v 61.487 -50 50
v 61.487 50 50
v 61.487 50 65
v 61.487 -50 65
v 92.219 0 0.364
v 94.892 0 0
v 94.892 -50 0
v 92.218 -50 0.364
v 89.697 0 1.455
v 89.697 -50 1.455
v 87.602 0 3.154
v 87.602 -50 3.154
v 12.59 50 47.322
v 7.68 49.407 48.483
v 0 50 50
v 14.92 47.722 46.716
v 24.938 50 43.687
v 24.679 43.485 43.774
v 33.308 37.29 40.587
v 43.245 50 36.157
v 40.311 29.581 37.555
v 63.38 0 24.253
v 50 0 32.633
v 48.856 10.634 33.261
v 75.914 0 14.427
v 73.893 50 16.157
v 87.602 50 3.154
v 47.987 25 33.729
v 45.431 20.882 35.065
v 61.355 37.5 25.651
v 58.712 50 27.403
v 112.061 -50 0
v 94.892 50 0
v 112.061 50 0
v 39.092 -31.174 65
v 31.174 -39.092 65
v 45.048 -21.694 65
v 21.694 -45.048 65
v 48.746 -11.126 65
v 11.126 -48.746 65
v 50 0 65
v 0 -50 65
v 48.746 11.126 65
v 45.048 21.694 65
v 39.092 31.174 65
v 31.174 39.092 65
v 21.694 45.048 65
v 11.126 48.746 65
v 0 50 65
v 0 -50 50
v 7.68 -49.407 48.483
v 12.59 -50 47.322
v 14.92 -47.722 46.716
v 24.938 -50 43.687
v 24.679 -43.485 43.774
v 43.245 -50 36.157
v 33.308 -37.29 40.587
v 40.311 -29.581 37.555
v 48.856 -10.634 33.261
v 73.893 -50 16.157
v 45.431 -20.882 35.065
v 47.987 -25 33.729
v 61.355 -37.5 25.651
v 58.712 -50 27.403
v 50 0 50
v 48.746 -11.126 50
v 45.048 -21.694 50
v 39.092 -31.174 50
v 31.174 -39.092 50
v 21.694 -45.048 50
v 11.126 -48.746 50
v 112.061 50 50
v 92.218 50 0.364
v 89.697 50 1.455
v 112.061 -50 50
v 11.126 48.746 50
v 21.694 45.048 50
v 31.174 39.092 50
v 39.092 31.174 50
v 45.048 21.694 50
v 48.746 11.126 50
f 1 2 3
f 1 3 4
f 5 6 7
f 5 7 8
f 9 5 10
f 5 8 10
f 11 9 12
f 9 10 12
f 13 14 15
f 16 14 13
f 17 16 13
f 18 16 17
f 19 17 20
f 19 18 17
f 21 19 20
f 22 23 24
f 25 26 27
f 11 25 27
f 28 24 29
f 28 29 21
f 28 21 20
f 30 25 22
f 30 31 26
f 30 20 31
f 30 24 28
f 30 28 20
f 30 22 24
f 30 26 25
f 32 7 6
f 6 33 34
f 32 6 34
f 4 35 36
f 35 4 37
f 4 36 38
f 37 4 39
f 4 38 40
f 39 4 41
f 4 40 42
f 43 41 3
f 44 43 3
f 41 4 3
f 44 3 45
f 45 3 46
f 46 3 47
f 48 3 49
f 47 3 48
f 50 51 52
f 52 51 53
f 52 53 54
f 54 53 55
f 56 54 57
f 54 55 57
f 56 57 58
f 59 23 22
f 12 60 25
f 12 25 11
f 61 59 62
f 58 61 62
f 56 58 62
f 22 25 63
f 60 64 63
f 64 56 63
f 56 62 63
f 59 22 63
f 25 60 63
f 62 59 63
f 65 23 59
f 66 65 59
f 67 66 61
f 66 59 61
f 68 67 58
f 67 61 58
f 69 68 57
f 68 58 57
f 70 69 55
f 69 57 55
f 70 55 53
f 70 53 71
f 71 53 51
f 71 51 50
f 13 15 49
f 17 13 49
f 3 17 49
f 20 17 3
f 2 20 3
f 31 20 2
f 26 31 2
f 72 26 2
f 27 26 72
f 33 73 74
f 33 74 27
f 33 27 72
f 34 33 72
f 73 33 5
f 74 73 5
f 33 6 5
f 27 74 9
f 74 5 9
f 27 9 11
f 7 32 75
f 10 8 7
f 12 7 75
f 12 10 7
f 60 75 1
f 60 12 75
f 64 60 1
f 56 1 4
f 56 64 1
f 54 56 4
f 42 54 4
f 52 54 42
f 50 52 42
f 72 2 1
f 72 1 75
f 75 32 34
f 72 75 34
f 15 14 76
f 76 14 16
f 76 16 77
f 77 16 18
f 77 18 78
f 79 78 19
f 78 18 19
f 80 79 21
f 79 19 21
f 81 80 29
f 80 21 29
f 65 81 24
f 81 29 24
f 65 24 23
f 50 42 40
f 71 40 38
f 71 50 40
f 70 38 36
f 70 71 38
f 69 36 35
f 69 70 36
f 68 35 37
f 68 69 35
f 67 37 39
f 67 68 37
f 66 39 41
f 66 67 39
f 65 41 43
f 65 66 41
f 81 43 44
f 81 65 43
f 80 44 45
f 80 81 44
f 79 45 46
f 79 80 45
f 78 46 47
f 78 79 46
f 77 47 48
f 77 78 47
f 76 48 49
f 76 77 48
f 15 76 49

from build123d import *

# Parameters (mm, degrees)
BOSS_EXTRUDE1_DEPTH     = 50
CUT_EXTRUDE1_DEPTH      = 122
CUT_EXTRUDE1_DEPTH_BACK = 98
FILLET1_R               = 10
BOSS_EXTRUDE2_DEPTH     = 15


with BuildPart() as part:
    # Sketch1 → Boss-Extrude1 (new body)
    with BuildSketch(Plane.XY):
        with BuildLine():
            Line((112.060798049, 50), (0, 50))
            ThreePointArc((0, 50), (35.355339059, 35.355339059), (50, 0))
            ThreePointArc((50, 0), (35.355339059, -35.355339059), (0, -50))
            Line((0, -50), (112.060798049, -50))
            Line((112.060798049, -50), (112.060798049, 50))
        make_face()
    extrude(amount=BOSS_EXTRUDE1_DEPTH)

    # Sketch2 → Cut-Extrude1 (cut, two sides)
    with BuildSketch(Plane(origin=(0, 0, 0), x_dir=(1, 0, 0), z_dir=(0, 1, 0))) as cut_extrude1_sk:
        with BuildLine():
            Line((90.490413338, 0), (0, 0))
            Line((0, 0), (0, -50))
            add(Edge.make_bspline(
                [(0, -50), (54.321214116, -40.505522655), (90.490413338, 0)],
                knots=[0, 0, 0, 1, 1, 1], degree=2))
        make_face()
    extrude(amount=CUT_EXTRUDE1_DEPTH, mode=Mode.SUBTRACT)
    extrude(cut_extrude1_sk.sketch, amount=-CUT_EXTRUDE1_DEPTH_BACK, mode=Mode.SUBTRACT)

    # Fillet1
    fillet1_edges = [part.edges().sort_by_distance(p)[0] for p in [
        (90.490413338, -25, 0),
    ]]
    fillet(fillet1_edges, radius=FILLET1_R)

    # Sketch3 → Boss-Extrude2 (add)
    with BuildSketch(Plane.XY.offset(50)):
        with BuildLine():
            Line((0, 50), (61.486792526, 50))
            Line((61.486792526, 50), (61.486792526, -50))
            Line((61.486792526, -50), (0, -50))
            ThreePointArc((0, -50), (50, 0), (0, 50))
        make_face()
    extrude(amount=BOSS_EXTRUDE2_DEPTH)


solid = part.part
